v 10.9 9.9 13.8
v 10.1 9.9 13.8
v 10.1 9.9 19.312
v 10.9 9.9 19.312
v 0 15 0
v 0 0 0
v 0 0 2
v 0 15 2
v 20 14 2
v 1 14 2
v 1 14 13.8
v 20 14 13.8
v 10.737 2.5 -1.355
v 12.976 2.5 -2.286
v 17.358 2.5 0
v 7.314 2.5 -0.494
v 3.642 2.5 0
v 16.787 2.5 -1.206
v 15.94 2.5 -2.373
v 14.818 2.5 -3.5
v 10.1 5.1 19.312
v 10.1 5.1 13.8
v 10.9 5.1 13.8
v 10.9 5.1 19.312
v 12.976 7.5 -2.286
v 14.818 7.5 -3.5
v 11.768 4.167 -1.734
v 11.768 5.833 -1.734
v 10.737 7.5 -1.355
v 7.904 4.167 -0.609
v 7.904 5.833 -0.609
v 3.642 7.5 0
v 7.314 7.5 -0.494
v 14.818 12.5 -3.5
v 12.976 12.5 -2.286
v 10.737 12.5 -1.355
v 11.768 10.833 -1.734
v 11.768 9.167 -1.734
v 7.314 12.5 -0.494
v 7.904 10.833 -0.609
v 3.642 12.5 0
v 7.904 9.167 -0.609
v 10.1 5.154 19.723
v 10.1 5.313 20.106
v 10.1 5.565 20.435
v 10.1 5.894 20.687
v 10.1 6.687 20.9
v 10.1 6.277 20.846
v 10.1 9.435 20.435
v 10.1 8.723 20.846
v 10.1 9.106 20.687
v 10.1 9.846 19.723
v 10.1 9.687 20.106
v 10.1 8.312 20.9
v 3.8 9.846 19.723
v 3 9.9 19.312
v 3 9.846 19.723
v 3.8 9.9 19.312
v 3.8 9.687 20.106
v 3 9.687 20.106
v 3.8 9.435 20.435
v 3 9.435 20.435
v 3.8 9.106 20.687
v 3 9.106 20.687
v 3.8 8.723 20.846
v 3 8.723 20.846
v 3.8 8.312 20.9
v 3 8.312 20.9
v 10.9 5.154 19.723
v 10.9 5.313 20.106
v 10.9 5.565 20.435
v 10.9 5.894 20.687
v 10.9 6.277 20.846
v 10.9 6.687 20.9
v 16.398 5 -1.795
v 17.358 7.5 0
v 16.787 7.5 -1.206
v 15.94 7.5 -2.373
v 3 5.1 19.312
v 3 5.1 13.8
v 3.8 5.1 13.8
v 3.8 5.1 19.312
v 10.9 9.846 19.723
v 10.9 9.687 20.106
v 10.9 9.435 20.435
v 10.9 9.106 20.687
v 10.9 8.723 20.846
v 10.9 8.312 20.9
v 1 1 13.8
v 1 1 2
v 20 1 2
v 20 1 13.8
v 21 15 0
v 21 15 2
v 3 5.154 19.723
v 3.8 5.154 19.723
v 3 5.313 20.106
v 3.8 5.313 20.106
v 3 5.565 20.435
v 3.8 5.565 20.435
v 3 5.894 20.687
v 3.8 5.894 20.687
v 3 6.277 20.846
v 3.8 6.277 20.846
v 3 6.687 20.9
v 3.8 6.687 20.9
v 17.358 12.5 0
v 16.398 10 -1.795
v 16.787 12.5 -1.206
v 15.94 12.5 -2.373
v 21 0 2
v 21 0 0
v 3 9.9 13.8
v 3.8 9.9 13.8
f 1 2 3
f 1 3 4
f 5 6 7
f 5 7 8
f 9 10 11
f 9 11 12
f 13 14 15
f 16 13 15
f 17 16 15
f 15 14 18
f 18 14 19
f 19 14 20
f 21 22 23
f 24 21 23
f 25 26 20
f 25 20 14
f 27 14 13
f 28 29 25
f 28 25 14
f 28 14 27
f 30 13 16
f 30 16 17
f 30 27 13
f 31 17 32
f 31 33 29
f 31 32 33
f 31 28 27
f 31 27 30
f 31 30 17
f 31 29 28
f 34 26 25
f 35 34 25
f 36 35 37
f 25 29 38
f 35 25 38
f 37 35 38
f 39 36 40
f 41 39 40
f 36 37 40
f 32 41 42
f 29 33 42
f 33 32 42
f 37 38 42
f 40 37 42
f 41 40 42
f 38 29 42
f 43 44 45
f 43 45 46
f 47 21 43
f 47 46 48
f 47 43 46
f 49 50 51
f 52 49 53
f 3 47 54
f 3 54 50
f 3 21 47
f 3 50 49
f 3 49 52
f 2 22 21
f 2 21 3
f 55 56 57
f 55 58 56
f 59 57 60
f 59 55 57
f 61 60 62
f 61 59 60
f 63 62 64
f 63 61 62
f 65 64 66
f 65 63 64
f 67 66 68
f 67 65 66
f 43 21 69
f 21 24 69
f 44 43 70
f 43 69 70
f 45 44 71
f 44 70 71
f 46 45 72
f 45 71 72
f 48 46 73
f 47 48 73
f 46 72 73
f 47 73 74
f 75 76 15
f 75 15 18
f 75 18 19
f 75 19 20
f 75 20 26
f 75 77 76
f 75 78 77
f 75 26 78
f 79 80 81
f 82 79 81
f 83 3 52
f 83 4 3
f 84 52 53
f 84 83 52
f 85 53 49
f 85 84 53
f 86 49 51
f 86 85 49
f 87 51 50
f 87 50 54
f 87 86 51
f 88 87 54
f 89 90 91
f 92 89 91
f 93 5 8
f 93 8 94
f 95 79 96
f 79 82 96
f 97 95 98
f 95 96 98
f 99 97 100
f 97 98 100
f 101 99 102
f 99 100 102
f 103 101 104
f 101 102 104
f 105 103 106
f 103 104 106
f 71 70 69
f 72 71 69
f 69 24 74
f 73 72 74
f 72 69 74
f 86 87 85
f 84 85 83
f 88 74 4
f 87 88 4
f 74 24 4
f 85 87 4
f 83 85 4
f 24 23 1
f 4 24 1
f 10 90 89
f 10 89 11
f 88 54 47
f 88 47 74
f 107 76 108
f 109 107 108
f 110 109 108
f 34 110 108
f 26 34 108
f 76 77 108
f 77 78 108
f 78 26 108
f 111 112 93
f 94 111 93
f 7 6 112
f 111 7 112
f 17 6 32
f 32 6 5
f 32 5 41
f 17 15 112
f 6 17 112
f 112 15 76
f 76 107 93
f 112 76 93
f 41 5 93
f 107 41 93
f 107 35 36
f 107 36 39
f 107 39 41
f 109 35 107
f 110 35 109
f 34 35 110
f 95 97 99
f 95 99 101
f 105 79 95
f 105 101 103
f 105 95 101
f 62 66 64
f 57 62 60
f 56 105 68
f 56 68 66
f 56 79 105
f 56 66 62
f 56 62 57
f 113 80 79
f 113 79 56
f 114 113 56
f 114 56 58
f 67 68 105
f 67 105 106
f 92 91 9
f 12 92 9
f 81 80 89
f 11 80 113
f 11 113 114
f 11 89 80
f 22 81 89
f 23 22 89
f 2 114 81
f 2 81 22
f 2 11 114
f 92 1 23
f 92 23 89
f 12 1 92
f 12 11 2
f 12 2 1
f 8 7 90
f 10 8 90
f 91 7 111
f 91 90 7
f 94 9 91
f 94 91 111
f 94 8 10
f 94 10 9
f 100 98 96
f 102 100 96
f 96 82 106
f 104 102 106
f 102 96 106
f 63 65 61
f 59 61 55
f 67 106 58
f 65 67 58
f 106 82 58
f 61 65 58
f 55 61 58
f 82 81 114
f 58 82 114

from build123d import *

# Parameters (mm, degrees)
SKETCH1_W           = 21
SKETCH1_H           = 15
BOSS_EXTRUDE1_DEPTH = 2
BOSS_EXTRUDE2_DEPTH = 5
SKETCH3_W           = 19
SKETCH3_H           = 13
BOSS_EXTRUDE3_DEPTH = 11.8
SKETCH4_W           = 0.8
SKETCH4_H           = 4.8
BOSS_EXTRUDE4_DEPTH = 7.1
FILLET1_R           = 1.5875


with BuildPart() as part:
    # Sketch1 → Boss-Extrude1 (new body)
    with BuildSketch(Plane.XY):
        with Locations((10.5, 7.5)):
            Rectangle(SKETCH1_W, SKETCH1_H)
    extrude(amount=BOSS_EXTRUDE1_DEPTH)

    # Sketch2 → Boss-Extrude2 (add, symmetric)
    with BuildSketch(Plane(origin=(0, 7.5, 0), x_dir=(-1, 0, 0), z_dir=(0, -1, 0))):
        with BuildLine():
            Line((-14.818, 0), (-17.358, 0))
            add(Edge.make_bspline(
                [(-17.358, 0), (-16.707682386, 1.839588495), (-14.818, 3.5)],
                knots=[0, 0, 0, 1, 1, 1], degree=2))
            add(Edge.make_bspline(
                [(-14.818, 3.5), (-12.312840272, 1.371089101), (-7.964569246, 0.392132644), (-3.642, 0)],
                knots=[0, 0, 0, 0, 1, 1, 1, 1], degree=3))
            Line((-3.642, 0), (-14.818, 0))
        make_face()
    extrude(amount=BOSS_EXTRUDE2_DEPTH, both=True)

    # Sketch3 → Boss-Extrude3 (add)
    with BuildSketch(Plane.XY.offset(2)):
        with Locations((10.5, 7.5)):
            Rectangle(SKETCH3_W, SKETCH3_H)
    extrude(amount=BOSS_EXTRUDE3_DEPTH)

    # Sketch4 → Boss-Extrude4 (add)
    with BuildSketch(Plane.XY.offset(13.8)):
        with Locations((3.4, 7.5)):
            Rectangle(SKETCH4_W, SKETCH4_H)
        with Locations((10.5, 7.5)):
            Rectangle(SKETCH4_W, SKETCH4_H)
    extrude(amount=BOSS_EXTRUDE4_DEPTH)

    # Fillet1
    fillet1_edges = [part.edges().sort_by_distance(p)[0] for p in [
        (3.4, 5.1, 20.9),
        (3.4, 9.9, 20.9),
        (10.5, 5.1, 20.9),
        (10.5, 9.9, 20.9),
    ]]
    fillet(fillet1_edges, radius=FILLET1_R)


solid = part.part
